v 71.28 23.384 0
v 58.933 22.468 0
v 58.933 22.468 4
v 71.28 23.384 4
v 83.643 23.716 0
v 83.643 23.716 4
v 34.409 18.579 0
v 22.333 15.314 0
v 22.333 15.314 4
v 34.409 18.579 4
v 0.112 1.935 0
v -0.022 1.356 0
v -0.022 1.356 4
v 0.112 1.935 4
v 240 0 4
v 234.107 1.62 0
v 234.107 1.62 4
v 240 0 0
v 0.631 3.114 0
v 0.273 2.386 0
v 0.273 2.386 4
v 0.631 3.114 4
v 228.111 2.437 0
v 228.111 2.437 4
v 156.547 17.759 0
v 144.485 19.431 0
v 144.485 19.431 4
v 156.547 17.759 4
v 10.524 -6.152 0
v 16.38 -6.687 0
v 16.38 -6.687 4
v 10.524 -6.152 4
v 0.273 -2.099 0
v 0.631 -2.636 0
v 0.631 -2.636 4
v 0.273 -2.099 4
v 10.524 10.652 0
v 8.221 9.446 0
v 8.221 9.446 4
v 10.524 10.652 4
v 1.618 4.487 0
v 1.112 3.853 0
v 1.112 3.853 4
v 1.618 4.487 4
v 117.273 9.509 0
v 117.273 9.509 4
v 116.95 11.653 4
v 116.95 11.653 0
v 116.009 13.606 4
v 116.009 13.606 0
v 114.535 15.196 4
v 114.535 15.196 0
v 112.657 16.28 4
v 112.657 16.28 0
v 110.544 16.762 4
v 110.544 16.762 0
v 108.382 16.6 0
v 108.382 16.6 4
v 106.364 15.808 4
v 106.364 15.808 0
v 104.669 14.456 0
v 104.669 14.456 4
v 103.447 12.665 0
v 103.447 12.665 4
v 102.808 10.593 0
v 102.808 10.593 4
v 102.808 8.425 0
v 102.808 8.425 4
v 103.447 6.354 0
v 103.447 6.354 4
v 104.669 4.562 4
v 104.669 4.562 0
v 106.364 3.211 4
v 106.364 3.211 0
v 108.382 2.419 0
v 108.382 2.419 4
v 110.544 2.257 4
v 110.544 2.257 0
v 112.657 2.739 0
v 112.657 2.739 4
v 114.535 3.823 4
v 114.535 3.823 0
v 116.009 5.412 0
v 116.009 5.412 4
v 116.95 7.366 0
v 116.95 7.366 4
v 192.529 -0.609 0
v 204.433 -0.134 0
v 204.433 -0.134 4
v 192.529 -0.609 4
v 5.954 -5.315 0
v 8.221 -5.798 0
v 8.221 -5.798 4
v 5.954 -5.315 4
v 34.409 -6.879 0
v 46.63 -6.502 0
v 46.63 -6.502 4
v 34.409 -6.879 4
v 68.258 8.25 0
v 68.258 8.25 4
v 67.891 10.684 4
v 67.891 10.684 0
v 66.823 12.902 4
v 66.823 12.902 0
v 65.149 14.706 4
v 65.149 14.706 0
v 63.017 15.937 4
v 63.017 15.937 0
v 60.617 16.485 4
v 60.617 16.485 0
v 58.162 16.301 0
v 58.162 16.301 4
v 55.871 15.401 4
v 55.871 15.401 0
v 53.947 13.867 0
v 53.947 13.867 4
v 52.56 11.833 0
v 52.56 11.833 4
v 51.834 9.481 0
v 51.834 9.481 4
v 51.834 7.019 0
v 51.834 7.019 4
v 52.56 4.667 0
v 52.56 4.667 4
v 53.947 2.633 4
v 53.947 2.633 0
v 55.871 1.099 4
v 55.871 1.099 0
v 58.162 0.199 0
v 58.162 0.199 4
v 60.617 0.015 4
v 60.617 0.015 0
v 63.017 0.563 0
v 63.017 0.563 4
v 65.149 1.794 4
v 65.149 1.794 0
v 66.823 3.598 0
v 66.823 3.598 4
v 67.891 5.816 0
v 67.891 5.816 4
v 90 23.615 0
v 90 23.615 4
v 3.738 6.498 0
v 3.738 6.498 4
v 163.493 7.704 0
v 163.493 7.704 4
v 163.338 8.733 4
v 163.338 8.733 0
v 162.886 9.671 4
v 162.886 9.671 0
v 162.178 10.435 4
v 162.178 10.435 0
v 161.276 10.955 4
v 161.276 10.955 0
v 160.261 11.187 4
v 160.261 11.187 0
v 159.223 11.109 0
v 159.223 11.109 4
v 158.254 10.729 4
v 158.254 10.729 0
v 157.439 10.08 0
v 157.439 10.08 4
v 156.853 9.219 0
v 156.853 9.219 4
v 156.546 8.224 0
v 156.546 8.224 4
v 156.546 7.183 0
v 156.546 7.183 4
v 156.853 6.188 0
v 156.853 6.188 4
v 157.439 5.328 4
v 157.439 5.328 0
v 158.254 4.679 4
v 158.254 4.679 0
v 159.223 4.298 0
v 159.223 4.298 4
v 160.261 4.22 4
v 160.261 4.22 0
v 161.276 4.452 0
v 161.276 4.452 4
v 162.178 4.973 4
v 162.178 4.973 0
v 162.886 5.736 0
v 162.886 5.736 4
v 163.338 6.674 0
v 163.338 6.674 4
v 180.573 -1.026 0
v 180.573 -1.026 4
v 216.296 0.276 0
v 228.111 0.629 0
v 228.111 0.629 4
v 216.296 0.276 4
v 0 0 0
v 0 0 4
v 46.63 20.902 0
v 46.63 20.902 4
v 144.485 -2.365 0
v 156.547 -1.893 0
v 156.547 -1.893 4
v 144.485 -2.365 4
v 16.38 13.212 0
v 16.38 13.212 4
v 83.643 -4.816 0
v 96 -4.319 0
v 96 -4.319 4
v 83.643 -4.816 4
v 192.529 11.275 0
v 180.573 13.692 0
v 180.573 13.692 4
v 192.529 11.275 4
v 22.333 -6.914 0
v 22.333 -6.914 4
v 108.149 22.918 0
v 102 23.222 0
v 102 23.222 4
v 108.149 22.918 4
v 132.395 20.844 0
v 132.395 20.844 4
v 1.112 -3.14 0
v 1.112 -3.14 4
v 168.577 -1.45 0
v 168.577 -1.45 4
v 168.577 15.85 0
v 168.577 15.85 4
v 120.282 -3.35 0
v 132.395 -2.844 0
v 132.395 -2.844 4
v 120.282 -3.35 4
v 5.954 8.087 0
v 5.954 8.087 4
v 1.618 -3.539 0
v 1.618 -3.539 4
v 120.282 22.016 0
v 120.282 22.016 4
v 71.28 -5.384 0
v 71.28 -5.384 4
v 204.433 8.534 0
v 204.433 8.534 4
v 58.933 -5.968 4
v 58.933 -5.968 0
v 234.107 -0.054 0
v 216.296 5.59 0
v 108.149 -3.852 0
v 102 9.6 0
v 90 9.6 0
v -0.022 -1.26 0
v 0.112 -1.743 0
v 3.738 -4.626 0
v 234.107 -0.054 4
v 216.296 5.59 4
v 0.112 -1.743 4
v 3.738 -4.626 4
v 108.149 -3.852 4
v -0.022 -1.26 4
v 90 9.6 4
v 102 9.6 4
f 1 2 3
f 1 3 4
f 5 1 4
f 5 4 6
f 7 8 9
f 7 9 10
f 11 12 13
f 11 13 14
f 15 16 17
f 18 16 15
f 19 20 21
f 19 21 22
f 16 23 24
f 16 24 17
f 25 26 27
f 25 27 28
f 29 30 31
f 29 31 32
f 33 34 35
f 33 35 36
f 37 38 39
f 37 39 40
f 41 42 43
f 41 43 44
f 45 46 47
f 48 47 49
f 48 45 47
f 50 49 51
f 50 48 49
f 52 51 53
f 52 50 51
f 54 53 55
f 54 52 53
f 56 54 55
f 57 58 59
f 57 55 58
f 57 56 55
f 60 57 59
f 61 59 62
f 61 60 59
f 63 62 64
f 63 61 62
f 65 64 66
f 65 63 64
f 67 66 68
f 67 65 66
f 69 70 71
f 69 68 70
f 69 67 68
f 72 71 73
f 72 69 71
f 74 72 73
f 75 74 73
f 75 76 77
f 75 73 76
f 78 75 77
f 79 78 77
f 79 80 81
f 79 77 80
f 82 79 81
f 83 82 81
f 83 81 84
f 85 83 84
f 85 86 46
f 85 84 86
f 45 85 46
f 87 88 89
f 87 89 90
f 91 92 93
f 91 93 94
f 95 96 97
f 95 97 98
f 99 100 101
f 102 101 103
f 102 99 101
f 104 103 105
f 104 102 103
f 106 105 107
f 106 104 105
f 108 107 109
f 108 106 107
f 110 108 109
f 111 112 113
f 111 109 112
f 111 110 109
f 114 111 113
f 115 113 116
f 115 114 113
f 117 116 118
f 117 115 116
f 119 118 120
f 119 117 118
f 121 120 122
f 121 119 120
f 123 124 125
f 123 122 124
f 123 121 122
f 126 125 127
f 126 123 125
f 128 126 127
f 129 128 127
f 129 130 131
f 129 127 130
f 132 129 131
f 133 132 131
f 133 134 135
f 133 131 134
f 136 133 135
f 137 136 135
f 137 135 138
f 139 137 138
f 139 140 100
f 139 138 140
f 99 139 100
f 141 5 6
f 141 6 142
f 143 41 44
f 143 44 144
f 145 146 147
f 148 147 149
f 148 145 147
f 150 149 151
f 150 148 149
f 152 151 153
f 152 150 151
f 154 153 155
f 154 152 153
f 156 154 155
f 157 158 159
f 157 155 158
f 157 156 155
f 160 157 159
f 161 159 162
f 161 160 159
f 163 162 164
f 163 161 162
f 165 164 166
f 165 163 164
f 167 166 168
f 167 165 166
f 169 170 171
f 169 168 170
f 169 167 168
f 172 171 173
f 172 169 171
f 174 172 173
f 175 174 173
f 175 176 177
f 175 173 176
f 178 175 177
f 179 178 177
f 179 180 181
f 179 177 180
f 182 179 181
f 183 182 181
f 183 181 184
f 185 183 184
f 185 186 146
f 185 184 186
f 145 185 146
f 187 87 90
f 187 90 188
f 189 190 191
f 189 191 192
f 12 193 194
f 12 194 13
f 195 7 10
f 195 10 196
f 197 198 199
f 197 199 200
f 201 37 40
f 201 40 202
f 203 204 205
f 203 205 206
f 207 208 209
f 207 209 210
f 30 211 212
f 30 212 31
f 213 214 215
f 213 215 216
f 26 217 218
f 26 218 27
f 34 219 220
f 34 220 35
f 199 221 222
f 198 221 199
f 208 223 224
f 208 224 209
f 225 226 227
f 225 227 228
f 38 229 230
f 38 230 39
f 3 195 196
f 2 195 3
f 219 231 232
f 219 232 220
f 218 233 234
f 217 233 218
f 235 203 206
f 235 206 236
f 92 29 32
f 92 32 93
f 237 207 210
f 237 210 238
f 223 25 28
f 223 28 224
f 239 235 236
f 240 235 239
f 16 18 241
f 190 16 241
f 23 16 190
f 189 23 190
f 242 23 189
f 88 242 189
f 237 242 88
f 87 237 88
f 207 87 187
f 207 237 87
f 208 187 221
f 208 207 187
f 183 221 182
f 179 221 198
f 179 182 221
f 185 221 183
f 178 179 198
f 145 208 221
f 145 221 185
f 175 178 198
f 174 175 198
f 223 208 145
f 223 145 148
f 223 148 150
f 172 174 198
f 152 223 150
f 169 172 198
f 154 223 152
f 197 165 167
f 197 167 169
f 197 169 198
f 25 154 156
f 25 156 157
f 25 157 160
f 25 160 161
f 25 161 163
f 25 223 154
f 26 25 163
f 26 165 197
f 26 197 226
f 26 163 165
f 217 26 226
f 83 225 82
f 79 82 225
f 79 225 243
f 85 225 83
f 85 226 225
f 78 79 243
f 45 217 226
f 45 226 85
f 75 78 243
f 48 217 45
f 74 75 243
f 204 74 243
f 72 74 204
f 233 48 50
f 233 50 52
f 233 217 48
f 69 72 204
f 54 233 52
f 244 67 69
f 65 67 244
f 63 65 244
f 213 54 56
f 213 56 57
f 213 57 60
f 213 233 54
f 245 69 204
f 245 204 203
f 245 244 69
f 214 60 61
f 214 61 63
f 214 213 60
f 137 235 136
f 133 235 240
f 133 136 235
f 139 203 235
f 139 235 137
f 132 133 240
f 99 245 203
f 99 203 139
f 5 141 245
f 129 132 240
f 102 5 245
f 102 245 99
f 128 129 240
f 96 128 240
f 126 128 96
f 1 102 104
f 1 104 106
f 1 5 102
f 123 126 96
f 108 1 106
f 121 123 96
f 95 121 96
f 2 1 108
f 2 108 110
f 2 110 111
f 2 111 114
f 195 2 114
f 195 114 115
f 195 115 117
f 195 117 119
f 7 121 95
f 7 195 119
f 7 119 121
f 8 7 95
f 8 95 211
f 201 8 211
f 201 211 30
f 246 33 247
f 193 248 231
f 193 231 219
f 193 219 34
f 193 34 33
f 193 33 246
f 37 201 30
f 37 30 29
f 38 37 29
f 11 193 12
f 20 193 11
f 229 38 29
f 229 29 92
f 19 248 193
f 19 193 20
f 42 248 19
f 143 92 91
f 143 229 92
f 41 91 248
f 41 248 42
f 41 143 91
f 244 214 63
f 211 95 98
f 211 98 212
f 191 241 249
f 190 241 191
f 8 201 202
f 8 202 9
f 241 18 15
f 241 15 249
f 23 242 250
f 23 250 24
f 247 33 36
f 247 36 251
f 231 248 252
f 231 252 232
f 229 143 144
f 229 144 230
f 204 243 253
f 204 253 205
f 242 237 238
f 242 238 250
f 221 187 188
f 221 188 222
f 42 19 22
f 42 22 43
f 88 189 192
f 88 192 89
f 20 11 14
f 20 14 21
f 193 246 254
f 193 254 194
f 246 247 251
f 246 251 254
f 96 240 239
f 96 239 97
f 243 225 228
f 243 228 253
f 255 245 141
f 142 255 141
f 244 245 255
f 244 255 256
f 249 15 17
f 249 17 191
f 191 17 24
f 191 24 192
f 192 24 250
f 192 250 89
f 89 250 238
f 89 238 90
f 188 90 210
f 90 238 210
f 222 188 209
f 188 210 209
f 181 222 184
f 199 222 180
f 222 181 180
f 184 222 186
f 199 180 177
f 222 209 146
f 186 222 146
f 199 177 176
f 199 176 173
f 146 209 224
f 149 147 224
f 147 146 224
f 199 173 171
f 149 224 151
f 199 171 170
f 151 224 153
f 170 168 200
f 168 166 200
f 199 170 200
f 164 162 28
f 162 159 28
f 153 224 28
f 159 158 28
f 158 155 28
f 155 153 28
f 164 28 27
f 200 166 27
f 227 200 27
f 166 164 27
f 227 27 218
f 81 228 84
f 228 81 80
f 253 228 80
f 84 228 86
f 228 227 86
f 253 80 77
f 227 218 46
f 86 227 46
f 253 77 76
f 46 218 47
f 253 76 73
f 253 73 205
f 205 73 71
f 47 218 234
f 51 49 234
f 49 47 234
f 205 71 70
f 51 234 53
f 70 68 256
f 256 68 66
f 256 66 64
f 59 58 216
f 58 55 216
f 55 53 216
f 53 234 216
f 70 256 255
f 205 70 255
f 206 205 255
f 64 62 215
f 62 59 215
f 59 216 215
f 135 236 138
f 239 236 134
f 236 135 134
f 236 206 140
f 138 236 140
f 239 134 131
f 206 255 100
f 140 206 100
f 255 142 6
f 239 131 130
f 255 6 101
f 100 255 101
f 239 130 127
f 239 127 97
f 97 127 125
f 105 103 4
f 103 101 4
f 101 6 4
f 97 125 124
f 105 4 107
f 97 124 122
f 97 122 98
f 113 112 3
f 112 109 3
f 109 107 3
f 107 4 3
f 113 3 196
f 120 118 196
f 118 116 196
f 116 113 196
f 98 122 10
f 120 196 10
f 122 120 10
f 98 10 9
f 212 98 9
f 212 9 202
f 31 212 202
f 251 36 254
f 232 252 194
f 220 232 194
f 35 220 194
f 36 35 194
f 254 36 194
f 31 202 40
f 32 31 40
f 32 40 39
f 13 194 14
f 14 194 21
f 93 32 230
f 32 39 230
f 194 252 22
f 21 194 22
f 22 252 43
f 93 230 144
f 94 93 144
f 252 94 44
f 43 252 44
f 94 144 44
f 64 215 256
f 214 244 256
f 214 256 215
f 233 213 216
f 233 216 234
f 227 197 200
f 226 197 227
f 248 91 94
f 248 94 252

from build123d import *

# Parameters (mm, degrees)
EXTRUDE_1_DEPTH     = 4
SKETCH_2_R          = 8.2578
CUT_EXTRUDE_1_DEPTH = 242.202090903
SKETCH_3_W          = 12
SKETCH_3_H          = 15
CUT_EXTRUDE_2_DEPTH = 242.202090903
SKETCH_4_R          = 7.273
CUT_EXTRUDE_3_DEPTH = 242.202090903
SKETCH_5_R          = 3.493
CUT_EXTRUDE_4_DEPTH = 242.202090903


with BuildPart() as part:
    # 草图1 → 凸台-拉伸1 (new body)
    with BuildSketch(Plane.XY):
        Polygon((0, 0), (-0.022, 1.356), (0.112, 1.935), (0.273, 2.386), (0.631, 3.114), (1.112, 3.853), (1.618, 4.487), (3.738, 6.498), (5.954, 8.087), (8.221, 9.446), (10.524, 10.652), (16.38, 13.212), (22.333, 15.314), (34.409, 18.579), (46.63, 20.902), (58.933, 22.468), (71.28, 23.384), (83.643, 23.716), (96, 23.519), (108.149, 22.918), (120.282, 22.016), (132.395, 20.844), (144.485, 19.431), (156.547, 17.759), (168.577, 15.85), (180.573, 13.692), (192.529, 11.275), (204.433, 8.534), (216.296, 5.59), (228.111, 2.437), (234.107, 1.62), (240, 0), (234.107, -0.054), (228.111, 0.629), (216.296, 0.276), (204.433, -0.134), (192.529, -0.609), (180.573, -1.026), (168.577, -1.45), (156.547, -1.893), (144.485, -2.365), (132.395, -2.844), (120.282, -3.35), (108.149, -3.852), (96, -4.319), (83.643, -4.816), (71.28, -5.384), (58.933, -5.968), (46.63, -6.502), (34.409, -6.879), (22.333, -6.914), (16.38, -6.687), (10.524, -6.152), (8.221, -5.798), (5.954, -5.315), (3.738, -4.626), (1.618, -3.539), (1.112, -3.14), (0.631, -2.636), (0.273, -2.099), (0.112, -1.743), (-0.022, -1.26), align=None)
    extrude(amount=EXTRUDE_1_DEPTH)

    # 草图2 → 切除-拉伸1 (cut, through all)
    with BuildSketch(Plane.XY):
        with Locations((60, 8.25)):
            Circle(SKETCH_2_R)
    extrude(amount=CUT_EXTRUDE_1_DEPTH, mode=Mode.SUBTRACT)

    # 草图3 → 切除-拉伸2 (cut, through all)
    with BuildSketch(Plane.XY):
        with Locations((96, 17.1)):
            Rectangle(SKETCH_3_W, SKETCH_3_H)
    extrude(amount=CUT_EXTRUDE_2_DEPTH, mode=Mode.SUBTRACT)

    # 草图4 → 切除-拉伸3 (cut, through all)
    with BuildSketch(Plane.XY):
        with Locations((110, 9.5093)):
            Circle(SKETCH_4_R)
    extrude(amount=CUT_EXTRUDE_3_DEPTH, mode=Mode.SUBTRACT)

    # 草图5 → 切除-拉伸4 (cut, through all)
    with BuildSketch(Plane.XY):
        with Locations((160, 7.7037)):
            Circle(SKETCH_5_R)
    extrude(amount=CUT_EXTRUDE_4_DEPTH, mode=Mode.SUBTRACT)


solid = part.part
